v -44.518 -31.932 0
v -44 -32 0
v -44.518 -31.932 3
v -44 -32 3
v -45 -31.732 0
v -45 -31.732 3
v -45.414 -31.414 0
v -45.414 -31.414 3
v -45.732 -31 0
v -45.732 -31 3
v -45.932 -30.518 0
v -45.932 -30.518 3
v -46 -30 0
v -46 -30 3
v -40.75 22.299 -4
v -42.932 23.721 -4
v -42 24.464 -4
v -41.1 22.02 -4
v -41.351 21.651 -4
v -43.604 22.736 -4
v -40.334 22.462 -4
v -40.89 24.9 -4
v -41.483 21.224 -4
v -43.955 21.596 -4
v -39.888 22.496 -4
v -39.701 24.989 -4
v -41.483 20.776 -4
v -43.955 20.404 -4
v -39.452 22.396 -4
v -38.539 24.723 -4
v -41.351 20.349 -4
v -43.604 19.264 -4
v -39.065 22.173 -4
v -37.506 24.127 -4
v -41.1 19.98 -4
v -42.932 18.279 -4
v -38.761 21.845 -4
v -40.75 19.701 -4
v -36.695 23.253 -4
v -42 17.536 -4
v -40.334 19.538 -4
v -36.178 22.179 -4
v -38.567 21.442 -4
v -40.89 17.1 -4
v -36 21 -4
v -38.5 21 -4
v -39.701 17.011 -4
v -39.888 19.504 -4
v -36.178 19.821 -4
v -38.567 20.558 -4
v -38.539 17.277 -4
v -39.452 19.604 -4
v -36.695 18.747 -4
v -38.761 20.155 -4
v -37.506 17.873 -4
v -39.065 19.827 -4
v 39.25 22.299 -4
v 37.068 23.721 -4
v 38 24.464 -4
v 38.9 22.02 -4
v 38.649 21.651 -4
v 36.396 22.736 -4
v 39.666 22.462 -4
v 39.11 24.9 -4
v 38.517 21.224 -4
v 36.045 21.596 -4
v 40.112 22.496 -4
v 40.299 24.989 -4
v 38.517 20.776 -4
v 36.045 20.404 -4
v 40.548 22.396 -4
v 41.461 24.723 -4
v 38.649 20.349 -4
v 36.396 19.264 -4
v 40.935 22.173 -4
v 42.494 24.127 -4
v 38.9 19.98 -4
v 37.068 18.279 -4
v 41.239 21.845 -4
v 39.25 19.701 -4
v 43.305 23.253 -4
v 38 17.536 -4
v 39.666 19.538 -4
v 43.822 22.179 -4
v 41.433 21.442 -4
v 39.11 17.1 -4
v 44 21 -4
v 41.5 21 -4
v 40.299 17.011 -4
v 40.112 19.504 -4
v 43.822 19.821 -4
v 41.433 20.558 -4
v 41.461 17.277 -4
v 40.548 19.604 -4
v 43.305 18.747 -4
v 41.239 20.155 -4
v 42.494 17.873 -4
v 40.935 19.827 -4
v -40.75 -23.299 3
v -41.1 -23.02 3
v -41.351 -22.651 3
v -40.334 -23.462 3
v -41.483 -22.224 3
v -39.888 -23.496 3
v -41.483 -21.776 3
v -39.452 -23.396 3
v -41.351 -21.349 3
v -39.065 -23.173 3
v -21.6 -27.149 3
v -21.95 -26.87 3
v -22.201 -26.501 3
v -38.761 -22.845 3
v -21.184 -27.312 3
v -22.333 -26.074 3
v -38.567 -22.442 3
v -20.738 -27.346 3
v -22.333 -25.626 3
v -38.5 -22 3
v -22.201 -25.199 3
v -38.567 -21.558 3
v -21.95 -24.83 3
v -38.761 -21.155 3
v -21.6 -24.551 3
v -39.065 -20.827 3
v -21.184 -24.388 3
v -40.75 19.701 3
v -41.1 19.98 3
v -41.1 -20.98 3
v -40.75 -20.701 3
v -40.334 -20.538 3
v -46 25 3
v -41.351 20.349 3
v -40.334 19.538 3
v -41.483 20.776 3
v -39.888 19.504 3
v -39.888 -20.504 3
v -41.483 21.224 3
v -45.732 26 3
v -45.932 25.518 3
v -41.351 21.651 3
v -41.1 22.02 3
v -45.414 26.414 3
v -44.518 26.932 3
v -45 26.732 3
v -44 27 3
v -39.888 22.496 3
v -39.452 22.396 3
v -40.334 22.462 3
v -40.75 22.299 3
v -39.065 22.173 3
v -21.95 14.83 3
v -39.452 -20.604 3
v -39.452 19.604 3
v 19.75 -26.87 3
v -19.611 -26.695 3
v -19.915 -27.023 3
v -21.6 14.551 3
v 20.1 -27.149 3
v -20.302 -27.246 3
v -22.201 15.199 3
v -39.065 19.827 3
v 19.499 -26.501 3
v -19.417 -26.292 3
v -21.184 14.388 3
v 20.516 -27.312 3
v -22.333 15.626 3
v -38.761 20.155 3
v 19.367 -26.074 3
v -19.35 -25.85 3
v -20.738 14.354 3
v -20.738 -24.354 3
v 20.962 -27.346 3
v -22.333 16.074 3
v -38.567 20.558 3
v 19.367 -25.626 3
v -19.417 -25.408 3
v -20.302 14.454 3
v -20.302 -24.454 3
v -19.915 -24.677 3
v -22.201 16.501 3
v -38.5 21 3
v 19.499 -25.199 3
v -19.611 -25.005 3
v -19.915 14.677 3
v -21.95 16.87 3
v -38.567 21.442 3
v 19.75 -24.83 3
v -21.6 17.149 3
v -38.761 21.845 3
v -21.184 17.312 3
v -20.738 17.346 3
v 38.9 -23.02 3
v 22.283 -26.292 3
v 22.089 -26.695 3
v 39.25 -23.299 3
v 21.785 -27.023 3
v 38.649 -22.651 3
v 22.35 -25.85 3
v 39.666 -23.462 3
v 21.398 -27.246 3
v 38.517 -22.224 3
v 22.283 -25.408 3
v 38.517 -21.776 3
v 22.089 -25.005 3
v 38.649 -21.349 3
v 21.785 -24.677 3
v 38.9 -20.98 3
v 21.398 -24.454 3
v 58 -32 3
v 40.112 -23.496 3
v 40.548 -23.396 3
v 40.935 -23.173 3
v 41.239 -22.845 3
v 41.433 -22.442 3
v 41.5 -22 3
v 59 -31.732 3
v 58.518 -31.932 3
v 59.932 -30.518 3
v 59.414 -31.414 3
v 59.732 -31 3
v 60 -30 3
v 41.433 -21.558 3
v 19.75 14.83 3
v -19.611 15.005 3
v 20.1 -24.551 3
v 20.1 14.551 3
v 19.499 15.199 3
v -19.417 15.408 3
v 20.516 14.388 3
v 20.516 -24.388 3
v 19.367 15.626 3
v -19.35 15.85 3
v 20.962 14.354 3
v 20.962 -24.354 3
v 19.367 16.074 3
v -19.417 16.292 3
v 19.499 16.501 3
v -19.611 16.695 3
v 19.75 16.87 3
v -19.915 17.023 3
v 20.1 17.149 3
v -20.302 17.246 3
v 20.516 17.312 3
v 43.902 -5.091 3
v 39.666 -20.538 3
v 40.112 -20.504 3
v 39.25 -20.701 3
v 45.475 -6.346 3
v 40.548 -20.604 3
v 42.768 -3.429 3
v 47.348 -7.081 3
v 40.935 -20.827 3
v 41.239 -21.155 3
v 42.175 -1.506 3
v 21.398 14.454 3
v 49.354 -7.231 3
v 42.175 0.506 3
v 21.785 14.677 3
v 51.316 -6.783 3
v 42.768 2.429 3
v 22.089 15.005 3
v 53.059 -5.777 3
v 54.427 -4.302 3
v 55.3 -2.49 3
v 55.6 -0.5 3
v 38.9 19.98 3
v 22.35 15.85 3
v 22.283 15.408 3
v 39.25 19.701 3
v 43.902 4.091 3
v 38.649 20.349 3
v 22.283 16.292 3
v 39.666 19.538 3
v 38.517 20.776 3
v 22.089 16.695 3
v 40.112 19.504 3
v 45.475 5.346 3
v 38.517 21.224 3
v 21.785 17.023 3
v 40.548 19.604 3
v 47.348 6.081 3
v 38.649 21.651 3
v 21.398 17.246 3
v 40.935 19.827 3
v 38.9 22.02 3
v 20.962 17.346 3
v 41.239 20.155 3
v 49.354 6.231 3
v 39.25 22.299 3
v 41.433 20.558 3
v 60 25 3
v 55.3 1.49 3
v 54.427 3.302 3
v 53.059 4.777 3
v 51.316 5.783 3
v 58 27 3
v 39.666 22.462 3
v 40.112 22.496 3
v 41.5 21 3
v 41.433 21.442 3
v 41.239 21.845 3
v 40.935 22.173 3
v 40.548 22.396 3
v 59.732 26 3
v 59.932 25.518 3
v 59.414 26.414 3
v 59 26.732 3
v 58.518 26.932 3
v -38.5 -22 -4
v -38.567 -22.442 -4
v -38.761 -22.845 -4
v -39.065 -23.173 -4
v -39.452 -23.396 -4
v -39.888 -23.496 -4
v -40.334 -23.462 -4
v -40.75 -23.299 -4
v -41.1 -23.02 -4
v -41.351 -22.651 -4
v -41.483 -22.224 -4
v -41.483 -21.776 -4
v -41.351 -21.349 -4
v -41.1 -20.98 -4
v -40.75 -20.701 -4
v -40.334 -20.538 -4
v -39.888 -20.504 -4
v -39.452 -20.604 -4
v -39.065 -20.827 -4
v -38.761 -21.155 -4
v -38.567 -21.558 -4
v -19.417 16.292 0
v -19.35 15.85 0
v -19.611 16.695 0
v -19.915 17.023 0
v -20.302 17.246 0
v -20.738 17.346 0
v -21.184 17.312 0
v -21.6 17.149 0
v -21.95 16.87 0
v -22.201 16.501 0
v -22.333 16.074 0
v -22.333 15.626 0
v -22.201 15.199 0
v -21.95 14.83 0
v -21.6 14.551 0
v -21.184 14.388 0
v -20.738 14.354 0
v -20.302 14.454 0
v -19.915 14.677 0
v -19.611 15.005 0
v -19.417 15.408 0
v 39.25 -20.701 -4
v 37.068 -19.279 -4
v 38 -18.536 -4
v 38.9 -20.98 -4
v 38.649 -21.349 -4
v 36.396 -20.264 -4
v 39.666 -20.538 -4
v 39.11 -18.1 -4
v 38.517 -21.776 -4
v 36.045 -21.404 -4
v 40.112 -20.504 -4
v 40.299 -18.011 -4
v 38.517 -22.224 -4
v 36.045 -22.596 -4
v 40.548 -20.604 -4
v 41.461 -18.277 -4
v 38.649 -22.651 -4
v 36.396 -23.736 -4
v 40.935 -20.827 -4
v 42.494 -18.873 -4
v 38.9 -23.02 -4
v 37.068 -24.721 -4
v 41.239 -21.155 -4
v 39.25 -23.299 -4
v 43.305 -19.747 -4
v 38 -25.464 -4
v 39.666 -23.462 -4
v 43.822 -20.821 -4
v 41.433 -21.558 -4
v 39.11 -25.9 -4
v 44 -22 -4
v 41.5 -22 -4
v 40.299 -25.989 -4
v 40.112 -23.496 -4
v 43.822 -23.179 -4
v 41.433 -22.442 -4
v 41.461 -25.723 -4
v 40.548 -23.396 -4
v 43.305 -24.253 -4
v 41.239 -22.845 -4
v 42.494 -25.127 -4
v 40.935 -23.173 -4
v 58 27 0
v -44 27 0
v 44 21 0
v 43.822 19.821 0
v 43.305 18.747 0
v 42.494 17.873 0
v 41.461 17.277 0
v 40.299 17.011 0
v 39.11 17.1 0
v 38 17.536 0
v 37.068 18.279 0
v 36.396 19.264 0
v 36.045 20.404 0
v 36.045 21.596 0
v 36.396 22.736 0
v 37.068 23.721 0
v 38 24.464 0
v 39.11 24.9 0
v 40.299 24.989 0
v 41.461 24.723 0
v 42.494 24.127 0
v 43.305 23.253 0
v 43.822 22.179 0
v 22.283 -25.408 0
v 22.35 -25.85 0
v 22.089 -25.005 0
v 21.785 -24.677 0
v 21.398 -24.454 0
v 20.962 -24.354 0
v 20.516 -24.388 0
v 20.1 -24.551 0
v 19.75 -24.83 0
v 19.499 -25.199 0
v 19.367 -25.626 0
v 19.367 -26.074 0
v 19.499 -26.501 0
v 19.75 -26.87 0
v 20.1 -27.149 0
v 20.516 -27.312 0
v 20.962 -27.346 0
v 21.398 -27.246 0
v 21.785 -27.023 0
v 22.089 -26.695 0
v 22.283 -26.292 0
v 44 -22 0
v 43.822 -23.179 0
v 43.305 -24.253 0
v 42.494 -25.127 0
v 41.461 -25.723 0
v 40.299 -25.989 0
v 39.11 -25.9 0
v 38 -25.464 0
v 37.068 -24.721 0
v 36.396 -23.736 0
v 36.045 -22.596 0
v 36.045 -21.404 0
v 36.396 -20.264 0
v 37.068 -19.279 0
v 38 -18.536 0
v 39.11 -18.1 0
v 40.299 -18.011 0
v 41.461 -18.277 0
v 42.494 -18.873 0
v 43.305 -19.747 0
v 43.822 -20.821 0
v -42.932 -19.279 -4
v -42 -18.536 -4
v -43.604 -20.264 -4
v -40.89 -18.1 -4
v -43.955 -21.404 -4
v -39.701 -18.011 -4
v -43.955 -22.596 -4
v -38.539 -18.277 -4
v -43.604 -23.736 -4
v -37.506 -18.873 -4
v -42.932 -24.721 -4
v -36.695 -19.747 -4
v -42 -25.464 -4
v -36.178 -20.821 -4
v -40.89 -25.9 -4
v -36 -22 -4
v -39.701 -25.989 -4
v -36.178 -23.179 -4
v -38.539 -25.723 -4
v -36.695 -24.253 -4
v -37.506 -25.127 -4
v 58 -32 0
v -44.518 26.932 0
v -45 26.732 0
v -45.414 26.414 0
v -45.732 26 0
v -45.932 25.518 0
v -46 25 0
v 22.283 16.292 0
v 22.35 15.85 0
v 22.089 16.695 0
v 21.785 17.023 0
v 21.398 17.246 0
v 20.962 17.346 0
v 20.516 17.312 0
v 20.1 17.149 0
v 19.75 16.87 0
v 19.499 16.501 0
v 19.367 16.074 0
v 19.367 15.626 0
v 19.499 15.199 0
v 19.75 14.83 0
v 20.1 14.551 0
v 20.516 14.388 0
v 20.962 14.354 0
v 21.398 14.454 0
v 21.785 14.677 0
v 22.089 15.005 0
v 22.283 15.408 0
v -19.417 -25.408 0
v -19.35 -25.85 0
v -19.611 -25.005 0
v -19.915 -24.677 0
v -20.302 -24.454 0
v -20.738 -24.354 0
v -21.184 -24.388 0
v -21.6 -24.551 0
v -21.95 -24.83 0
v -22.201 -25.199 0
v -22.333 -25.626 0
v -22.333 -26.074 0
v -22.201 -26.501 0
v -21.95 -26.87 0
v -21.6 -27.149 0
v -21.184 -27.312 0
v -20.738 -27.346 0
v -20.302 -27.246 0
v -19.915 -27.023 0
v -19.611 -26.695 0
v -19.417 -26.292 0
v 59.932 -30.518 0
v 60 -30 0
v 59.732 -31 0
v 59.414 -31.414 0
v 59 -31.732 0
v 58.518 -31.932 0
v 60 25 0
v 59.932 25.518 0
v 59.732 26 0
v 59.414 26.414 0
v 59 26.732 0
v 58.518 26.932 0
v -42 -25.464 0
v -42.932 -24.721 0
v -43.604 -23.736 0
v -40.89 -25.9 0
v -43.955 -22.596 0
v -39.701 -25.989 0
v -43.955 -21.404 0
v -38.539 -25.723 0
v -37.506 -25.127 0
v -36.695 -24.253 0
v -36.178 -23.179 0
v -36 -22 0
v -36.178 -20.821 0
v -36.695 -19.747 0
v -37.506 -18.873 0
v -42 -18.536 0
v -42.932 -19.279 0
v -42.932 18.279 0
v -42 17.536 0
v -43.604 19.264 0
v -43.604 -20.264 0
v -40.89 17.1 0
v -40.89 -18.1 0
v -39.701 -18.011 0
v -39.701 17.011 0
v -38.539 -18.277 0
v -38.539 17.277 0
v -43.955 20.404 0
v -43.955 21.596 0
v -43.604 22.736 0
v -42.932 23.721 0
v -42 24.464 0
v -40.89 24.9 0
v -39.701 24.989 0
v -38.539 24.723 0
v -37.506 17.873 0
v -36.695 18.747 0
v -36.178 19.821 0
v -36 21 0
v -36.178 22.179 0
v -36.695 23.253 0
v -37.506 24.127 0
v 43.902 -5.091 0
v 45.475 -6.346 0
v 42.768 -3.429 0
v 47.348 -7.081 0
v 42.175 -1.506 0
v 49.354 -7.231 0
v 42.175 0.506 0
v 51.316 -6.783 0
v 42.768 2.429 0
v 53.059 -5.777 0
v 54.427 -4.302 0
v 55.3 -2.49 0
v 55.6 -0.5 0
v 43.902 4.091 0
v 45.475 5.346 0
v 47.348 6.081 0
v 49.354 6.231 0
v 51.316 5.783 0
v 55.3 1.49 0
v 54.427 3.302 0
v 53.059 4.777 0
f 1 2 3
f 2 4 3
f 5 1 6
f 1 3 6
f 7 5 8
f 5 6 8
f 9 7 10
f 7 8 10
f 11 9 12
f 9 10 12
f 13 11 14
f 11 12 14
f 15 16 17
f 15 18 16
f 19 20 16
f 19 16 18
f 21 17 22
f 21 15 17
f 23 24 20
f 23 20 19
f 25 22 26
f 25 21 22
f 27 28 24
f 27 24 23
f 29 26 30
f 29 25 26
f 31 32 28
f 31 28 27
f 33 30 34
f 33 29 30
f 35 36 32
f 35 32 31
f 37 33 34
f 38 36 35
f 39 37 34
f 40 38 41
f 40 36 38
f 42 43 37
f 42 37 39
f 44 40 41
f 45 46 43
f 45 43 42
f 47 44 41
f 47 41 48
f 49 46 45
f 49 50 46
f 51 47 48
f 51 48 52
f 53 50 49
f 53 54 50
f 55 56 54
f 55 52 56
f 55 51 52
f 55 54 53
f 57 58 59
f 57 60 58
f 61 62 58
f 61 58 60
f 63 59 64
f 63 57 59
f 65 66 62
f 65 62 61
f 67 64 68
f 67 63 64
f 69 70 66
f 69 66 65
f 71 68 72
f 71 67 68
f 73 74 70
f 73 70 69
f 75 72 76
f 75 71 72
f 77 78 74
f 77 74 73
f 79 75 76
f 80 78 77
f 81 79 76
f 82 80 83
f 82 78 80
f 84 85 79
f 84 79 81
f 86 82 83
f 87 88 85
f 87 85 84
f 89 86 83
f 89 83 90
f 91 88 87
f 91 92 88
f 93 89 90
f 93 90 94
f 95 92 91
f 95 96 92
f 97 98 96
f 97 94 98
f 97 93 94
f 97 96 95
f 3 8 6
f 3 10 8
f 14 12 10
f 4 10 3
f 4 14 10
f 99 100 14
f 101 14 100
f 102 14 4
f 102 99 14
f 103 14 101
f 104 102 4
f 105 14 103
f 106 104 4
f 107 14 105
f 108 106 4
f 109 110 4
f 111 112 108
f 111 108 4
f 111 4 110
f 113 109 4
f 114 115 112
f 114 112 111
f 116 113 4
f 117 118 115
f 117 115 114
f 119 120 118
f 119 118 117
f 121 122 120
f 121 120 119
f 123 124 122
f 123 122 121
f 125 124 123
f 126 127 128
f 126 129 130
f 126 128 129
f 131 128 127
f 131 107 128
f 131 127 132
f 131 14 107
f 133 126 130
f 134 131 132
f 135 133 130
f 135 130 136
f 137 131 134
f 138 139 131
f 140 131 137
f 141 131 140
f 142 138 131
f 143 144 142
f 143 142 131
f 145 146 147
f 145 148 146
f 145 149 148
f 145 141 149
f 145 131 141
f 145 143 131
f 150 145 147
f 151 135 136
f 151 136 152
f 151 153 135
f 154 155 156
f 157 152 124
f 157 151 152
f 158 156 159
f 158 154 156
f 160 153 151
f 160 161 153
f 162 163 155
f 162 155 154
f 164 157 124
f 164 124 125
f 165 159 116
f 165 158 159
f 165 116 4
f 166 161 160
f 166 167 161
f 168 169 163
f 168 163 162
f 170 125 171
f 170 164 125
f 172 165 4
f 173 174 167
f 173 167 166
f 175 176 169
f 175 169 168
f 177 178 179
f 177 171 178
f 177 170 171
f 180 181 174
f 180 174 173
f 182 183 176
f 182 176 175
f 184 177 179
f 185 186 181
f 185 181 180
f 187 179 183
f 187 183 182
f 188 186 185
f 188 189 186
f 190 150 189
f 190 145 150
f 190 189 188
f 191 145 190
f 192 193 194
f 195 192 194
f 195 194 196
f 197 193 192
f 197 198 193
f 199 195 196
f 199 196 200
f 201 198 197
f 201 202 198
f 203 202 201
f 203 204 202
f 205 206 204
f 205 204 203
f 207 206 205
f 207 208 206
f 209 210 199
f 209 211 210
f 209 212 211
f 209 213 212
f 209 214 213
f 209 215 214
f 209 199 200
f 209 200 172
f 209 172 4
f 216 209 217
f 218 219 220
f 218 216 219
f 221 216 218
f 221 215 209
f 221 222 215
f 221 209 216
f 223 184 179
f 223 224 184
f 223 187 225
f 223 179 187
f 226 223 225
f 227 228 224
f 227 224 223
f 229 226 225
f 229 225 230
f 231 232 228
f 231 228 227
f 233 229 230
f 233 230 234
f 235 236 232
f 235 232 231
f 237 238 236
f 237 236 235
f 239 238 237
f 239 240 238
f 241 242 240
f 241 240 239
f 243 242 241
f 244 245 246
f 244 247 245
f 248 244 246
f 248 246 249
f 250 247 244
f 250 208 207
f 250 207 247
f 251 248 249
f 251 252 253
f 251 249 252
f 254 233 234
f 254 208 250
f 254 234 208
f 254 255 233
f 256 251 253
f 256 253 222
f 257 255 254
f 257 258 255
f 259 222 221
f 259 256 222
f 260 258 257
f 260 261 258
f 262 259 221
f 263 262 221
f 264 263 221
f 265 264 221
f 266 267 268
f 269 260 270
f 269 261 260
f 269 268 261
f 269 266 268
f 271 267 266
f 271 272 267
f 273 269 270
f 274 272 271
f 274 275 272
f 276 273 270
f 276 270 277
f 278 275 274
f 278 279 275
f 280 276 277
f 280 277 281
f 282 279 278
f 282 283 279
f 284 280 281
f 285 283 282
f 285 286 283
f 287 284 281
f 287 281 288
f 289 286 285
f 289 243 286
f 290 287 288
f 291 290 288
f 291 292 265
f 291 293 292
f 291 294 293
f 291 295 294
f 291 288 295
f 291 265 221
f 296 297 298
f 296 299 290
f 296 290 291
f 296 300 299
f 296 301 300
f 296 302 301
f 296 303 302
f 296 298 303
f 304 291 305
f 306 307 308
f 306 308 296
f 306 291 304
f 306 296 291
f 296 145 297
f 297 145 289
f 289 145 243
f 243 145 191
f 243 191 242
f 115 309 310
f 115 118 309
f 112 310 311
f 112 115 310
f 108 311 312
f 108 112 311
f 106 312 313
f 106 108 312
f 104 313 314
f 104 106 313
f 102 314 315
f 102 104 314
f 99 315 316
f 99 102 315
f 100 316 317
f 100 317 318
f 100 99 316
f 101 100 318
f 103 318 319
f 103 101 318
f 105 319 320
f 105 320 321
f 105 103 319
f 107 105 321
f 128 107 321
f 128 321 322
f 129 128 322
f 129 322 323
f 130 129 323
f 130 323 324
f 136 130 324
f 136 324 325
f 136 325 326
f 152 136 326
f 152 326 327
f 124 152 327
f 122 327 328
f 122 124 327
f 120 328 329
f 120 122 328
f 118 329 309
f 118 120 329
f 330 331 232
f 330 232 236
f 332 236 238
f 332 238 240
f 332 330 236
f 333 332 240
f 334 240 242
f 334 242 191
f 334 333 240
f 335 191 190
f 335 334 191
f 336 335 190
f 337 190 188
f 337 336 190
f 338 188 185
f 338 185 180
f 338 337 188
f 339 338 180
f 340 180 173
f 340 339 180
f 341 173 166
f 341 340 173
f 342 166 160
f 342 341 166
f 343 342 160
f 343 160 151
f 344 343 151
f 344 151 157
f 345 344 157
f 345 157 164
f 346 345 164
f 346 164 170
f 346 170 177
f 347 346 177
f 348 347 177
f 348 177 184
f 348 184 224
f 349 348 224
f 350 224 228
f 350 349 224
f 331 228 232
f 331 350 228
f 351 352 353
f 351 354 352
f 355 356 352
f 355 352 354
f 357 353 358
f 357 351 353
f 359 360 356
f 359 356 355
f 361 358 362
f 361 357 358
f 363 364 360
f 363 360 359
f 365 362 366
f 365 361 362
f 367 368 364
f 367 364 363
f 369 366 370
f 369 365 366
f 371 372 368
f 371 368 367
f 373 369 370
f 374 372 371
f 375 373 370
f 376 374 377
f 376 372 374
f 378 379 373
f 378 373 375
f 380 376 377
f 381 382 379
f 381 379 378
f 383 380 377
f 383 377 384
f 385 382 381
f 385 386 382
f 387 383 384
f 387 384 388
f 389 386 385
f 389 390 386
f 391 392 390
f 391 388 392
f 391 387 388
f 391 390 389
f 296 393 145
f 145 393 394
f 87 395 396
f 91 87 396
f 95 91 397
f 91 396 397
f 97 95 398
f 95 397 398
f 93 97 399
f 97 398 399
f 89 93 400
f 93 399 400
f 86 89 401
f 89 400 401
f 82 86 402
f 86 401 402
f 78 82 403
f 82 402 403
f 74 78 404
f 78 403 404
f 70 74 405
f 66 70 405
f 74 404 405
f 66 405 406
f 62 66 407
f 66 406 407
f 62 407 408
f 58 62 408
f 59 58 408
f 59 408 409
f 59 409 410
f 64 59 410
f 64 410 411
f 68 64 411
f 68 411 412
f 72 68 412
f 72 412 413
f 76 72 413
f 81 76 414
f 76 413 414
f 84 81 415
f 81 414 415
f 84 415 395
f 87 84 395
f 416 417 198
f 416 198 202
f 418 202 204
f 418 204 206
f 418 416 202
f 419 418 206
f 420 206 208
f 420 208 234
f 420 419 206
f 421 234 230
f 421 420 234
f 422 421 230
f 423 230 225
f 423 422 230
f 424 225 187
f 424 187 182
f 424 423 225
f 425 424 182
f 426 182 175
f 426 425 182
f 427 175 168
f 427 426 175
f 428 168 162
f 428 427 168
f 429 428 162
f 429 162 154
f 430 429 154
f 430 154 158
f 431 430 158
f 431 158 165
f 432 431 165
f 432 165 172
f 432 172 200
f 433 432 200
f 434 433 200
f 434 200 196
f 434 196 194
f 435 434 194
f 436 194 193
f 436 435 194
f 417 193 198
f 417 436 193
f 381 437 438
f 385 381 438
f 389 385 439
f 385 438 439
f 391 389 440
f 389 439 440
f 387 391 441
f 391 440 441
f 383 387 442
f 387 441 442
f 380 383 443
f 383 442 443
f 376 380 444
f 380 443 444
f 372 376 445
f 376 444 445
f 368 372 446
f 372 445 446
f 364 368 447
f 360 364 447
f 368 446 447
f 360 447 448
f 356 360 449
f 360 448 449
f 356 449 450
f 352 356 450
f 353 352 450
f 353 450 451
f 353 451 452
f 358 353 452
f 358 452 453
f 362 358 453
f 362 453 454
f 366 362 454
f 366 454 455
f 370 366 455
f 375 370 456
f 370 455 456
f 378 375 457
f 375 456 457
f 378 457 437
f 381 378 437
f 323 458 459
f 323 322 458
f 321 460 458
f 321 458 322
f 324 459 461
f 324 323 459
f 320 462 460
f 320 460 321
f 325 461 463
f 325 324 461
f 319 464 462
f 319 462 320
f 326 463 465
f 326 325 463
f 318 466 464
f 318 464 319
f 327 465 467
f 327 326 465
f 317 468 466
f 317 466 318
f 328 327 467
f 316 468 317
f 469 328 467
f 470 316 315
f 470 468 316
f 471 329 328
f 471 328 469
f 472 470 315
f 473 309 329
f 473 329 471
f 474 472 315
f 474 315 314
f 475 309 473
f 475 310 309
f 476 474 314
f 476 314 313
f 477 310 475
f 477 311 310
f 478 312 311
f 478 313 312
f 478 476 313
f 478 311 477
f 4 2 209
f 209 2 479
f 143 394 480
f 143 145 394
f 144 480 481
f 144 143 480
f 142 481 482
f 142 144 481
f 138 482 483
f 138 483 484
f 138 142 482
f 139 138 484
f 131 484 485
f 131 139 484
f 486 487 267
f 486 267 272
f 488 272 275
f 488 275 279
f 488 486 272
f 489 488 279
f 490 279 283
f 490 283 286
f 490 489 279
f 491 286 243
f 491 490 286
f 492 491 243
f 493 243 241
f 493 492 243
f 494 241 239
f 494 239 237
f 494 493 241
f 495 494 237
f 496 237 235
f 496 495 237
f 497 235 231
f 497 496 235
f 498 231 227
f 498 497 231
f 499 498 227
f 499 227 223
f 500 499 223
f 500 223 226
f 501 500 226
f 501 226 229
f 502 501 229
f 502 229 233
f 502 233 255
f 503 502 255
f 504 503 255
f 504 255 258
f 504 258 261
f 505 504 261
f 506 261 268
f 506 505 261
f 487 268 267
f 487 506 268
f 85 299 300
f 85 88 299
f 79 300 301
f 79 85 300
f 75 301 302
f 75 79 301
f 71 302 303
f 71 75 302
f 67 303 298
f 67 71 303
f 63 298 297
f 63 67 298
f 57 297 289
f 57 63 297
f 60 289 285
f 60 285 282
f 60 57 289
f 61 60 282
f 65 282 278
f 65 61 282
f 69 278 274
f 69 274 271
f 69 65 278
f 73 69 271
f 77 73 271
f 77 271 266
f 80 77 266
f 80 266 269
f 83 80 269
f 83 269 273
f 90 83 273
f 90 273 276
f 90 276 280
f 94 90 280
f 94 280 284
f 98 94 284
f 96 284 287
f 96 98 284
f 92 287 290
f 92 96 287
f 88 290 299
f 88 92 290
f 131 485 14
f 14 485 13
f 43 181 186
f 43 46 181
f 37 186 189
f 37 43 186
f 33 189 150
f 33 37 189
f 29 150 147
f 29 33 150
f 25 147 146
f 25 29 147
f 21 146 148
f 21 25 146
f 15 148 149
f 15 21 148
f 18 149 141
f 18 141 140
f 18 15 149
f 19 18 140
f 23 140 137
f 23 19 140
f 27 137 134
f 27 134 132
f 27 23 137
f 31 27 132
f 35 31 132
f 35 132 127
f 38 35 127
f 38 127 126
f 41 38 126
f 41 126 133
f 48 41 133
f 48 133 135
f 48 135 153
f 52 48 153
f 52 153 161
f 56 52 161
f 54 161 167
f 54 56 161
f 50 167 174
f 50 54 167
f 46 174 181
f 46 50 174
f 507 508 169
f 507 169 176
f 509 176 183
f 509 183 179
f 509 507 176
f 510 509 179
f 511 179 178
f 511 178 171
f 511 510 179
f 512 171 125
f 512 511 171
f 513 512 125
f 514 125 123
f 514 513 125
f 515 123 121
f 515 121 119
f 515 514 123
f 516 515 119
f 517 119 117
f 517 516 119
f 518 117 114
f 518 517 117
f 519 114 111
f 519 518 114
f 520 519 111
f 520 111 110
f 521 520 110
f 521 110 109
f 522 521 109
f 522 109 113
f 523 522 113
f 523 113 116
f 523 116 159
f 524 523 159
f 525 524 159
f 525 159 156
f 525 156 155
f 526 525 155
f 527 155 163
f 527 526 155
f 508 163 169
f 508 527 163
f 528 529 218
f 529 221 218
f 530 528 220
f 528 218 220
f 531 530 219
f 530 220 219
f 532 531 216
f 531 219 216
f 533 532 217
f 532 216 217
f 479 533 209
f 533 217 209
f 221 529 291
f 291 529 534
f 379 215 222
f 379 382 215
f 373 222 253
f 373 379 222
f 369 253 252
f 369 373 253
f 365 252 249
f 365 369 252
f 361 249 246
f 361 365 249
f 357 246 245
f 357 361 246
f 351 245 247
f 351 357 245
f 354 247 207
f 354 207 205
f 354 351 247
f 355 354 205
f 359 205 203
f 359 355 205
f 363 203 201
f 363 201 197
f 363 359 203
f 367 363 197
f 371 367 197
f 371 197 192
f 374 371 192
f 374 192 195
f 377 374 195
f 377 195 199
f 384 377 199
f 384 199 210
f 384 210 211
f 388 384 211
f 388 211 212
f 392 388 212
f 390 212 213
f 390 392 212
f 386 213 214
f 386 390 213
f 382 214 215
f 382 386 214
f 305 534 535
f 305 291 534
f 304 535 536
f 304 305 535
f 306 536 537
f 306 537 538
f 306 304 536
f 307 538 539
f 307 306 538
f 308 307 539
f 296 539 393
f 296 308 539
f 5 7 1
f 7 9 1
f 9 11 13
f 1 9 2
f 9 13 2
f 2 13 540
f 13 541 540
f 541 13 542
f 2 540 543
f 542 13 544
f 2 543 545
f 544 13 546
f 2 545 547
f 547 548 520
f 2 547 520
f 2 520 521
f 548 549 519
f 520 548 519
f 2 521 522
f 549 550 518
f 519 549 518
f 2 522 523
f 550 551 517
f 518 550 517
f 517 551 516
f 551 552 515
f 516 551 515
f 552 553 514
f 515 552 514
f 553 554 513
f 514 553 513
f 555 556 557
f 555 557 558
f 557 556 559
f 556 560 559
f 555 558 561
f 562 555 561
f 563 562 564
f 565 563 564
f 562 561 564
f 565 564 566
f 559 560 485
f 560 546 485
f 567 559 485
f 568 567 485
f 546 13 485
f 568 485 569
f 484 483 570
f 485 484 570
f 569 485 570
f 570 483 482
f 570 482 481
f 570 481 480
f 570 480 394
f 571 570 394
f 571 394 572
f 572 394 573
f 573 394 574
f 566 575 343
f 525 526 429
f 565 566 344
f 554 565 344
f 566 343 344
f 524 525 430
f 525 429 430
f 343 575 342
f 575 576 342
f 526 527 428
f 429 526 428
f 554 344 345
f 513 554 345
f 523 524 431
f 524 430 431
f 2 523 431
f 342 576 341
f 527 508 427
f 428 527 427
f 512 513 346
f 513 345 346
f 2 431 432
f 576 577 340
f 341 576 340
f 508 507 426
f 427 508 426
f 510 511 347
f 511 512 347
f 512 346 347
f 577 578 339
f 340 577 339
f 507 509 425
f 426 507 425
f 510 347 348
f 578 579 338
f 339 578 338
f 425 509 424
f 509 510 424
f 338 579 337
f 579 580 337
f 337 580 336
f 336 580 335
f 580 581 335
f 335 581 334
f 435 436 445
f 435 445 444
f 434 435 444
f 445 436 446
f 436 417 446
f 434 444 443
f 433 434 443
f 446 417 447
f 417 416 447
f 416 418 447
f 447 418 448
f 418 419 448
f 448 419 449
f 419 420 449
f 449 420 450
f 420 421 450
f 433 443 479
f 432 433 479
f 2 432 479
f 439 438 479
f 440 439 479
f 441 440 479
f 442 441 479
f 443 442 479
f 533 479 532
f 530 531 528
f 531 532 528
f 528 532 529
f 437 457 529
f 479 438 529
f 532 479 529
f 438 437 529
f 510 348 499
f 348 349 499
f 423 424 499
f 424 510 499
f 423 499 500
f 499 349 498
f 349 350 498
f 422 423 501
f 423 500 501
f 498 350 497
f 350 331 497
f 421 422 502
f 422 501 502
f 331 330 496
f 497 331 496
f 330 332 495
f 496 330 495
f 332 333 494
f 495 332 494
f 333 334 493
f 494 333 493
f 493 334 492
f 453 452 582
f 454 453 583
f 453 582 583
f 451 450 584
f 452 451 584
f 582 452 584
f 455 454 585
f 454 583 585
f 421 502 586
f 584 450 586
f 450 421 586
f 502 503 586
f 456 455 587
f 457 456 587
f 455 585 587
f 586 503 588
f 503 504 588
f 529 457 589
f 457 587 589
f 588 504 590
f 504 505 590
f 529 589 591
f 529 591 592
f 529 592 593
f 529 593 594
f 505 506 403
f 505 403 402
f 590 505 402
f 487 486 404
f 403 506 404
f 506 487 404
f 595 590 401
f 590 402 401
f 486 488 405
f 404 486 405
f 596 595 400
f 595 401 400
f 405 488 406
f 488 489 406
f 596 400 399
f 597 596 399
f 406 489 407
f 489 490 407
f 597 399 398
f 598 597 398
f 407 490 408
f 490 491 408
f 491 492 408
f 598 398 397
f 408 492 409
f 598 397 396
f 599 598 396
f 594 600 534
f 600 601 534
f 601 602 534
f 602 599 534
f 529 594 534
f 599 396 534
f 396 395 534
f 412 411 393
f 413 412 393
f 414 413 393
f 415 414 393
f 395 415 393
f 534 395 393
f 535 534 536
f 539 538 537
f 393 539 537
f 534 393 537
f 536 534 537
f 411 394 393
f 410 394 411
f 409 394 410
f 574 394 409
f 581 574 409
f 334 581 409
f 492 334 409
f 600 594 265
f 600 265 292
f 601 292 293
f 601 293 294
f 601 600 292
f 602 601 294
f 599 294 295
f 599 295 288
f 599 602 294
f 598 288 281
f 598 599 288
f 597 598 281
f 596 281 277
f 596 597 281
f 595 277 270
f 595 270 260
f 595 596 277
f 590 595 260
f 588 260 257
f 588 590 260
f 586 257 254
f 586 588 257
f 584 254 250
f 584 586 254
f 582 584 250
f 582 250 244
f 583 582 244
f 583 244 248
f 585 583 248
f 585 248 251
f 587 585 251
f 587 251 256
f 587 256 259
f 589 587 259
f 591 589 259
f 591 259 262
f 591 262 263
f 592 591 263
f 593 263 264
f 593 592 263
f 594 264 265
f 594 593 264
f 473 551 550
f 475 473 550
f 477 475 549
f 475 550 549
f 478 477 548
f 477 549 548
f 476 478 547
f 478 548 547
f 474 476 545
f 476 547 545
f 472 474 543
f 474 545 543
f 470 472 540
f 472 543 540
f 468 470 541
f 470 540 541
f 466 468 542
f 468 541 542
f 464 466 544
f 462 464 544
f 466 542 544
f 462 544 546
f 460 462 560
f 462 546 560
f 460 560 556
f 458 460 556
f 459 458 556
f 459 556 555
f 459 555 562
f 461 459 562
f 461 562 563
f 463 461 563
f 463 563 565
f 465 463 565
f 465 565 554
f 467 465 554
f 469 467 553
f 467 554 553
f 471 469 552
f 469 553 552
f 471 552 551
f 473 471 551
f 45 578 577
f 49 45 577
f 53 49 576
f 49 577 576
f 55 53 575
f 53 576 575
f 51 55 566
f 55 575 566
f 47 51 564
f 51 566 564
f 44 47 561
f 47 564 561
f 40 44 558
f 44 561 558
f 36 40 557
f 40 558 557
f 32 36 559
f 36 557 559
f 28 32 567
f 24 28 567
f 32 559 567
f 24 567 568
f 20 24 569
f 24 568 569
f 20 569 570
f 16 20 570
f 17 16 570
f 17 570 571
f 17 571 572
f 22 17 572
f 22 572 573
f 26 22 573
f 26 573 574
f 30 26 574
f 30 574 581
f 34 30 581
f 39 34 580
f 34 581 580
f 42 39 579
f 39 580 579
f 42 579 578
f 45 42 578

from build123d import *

# Parameters (mm, degrees)
SKETCH_R      = 1.5
SKETCH_R_2    = 6.75
PAD_DEPTH     = 3
SKETCH001_R   = 4
SKETCH001_R_2 = 1.5
PAD001_DEPTH  = 4
FILLET_R      = 2


with BuildPart() as part:
    # Sketch → Pad (new body)
    with BuildSketch(Plane.XY):
        Polygon((46, 27), (-46, 27), (-46, -28), (-46, -32), (60, -32), (60, -28), (60, 27), align=None)
        with Locations((20.85, 15.85)):
            Circle(SKETCH_R, mode=Mode.SUBTRACT)
        with Locations((-20.85, -25.85)):
            Circle(SKETCH_R, mode=Mode.SUBTRACT)
        with Locations((20.85, -25.85)):
            Circle(SKETCH_R, mode=Mode.SUBTRACT)
        with Locations((-20.85, 15.85)):
            Circle(SKETCH_R, mode=Mode.SUBTRACT)
        with Locations((48.85, -0.5)):
            Circle(SKETCH_R_2, mode=Mode.SUBTRACT)
        with Locations((-40, 21)):
            Circle(SKETCH_R, mode=Mode.SUBTRACT)
        with Locations((40, 21)):
            Circle(SKETCH_R, mode=Mode.SUBTRACT)
        with Locations((-40, -22)):
            Circle(SKETCH_R, mode=Mode.SUBTRACT)
        with Locations((40, -22)):
            Circle(SKETCH_R, mode=Mode.SUBTRACT)
    extrude(amount=PAD_DEPTH)

    # Sketch001 (on Face2 of Pad) → Pad001 (join)
    with BuildSketch(Plane(origin=(0, 0, 0), x_dir=(1, 0, 0), z_dir=(0, 0, -1))):
        with Locations((-40, 22)):
            Circle(SKETCH001_R)
        with Locations((-40, 22)):
            Circle(SKETCH001_R_2, mode=Mode.SUBTRACT)
        with Locations((40, 22)):
            Circle(SKETCH001_R)
        with Locations((40, 22)):
            Circle(SKETCH001_R_2, mode=Mode.SUBTRACT)
        with Locations((-40, -21)):
            Circle(SKETCH001_R)
        with Locations((-40, -21)):
            Circle(SKETCH001_R_2, mode=Mode.SUBTRACT)
        with Locations((40, -21)):
            Circle(SKETCH001_R)
        with Locations((40, -21)):
            Circle(SKETCH001_R_2, mode=Mode.SUBTRACT)
    extrude(amount=PAD001_DEPTH)

    # Fillet
    fillet_edges = [part.edges().sort_by_distance(p)[0] for p in [
        (-46, 27, 1.5),
        (-46, -32, 1.5),
        (60, -32, 1.5),
        (60, 27, 1.5),
    ]]
    fillet(fillet_edges, radius=FILLET_R)


solid = part.part
